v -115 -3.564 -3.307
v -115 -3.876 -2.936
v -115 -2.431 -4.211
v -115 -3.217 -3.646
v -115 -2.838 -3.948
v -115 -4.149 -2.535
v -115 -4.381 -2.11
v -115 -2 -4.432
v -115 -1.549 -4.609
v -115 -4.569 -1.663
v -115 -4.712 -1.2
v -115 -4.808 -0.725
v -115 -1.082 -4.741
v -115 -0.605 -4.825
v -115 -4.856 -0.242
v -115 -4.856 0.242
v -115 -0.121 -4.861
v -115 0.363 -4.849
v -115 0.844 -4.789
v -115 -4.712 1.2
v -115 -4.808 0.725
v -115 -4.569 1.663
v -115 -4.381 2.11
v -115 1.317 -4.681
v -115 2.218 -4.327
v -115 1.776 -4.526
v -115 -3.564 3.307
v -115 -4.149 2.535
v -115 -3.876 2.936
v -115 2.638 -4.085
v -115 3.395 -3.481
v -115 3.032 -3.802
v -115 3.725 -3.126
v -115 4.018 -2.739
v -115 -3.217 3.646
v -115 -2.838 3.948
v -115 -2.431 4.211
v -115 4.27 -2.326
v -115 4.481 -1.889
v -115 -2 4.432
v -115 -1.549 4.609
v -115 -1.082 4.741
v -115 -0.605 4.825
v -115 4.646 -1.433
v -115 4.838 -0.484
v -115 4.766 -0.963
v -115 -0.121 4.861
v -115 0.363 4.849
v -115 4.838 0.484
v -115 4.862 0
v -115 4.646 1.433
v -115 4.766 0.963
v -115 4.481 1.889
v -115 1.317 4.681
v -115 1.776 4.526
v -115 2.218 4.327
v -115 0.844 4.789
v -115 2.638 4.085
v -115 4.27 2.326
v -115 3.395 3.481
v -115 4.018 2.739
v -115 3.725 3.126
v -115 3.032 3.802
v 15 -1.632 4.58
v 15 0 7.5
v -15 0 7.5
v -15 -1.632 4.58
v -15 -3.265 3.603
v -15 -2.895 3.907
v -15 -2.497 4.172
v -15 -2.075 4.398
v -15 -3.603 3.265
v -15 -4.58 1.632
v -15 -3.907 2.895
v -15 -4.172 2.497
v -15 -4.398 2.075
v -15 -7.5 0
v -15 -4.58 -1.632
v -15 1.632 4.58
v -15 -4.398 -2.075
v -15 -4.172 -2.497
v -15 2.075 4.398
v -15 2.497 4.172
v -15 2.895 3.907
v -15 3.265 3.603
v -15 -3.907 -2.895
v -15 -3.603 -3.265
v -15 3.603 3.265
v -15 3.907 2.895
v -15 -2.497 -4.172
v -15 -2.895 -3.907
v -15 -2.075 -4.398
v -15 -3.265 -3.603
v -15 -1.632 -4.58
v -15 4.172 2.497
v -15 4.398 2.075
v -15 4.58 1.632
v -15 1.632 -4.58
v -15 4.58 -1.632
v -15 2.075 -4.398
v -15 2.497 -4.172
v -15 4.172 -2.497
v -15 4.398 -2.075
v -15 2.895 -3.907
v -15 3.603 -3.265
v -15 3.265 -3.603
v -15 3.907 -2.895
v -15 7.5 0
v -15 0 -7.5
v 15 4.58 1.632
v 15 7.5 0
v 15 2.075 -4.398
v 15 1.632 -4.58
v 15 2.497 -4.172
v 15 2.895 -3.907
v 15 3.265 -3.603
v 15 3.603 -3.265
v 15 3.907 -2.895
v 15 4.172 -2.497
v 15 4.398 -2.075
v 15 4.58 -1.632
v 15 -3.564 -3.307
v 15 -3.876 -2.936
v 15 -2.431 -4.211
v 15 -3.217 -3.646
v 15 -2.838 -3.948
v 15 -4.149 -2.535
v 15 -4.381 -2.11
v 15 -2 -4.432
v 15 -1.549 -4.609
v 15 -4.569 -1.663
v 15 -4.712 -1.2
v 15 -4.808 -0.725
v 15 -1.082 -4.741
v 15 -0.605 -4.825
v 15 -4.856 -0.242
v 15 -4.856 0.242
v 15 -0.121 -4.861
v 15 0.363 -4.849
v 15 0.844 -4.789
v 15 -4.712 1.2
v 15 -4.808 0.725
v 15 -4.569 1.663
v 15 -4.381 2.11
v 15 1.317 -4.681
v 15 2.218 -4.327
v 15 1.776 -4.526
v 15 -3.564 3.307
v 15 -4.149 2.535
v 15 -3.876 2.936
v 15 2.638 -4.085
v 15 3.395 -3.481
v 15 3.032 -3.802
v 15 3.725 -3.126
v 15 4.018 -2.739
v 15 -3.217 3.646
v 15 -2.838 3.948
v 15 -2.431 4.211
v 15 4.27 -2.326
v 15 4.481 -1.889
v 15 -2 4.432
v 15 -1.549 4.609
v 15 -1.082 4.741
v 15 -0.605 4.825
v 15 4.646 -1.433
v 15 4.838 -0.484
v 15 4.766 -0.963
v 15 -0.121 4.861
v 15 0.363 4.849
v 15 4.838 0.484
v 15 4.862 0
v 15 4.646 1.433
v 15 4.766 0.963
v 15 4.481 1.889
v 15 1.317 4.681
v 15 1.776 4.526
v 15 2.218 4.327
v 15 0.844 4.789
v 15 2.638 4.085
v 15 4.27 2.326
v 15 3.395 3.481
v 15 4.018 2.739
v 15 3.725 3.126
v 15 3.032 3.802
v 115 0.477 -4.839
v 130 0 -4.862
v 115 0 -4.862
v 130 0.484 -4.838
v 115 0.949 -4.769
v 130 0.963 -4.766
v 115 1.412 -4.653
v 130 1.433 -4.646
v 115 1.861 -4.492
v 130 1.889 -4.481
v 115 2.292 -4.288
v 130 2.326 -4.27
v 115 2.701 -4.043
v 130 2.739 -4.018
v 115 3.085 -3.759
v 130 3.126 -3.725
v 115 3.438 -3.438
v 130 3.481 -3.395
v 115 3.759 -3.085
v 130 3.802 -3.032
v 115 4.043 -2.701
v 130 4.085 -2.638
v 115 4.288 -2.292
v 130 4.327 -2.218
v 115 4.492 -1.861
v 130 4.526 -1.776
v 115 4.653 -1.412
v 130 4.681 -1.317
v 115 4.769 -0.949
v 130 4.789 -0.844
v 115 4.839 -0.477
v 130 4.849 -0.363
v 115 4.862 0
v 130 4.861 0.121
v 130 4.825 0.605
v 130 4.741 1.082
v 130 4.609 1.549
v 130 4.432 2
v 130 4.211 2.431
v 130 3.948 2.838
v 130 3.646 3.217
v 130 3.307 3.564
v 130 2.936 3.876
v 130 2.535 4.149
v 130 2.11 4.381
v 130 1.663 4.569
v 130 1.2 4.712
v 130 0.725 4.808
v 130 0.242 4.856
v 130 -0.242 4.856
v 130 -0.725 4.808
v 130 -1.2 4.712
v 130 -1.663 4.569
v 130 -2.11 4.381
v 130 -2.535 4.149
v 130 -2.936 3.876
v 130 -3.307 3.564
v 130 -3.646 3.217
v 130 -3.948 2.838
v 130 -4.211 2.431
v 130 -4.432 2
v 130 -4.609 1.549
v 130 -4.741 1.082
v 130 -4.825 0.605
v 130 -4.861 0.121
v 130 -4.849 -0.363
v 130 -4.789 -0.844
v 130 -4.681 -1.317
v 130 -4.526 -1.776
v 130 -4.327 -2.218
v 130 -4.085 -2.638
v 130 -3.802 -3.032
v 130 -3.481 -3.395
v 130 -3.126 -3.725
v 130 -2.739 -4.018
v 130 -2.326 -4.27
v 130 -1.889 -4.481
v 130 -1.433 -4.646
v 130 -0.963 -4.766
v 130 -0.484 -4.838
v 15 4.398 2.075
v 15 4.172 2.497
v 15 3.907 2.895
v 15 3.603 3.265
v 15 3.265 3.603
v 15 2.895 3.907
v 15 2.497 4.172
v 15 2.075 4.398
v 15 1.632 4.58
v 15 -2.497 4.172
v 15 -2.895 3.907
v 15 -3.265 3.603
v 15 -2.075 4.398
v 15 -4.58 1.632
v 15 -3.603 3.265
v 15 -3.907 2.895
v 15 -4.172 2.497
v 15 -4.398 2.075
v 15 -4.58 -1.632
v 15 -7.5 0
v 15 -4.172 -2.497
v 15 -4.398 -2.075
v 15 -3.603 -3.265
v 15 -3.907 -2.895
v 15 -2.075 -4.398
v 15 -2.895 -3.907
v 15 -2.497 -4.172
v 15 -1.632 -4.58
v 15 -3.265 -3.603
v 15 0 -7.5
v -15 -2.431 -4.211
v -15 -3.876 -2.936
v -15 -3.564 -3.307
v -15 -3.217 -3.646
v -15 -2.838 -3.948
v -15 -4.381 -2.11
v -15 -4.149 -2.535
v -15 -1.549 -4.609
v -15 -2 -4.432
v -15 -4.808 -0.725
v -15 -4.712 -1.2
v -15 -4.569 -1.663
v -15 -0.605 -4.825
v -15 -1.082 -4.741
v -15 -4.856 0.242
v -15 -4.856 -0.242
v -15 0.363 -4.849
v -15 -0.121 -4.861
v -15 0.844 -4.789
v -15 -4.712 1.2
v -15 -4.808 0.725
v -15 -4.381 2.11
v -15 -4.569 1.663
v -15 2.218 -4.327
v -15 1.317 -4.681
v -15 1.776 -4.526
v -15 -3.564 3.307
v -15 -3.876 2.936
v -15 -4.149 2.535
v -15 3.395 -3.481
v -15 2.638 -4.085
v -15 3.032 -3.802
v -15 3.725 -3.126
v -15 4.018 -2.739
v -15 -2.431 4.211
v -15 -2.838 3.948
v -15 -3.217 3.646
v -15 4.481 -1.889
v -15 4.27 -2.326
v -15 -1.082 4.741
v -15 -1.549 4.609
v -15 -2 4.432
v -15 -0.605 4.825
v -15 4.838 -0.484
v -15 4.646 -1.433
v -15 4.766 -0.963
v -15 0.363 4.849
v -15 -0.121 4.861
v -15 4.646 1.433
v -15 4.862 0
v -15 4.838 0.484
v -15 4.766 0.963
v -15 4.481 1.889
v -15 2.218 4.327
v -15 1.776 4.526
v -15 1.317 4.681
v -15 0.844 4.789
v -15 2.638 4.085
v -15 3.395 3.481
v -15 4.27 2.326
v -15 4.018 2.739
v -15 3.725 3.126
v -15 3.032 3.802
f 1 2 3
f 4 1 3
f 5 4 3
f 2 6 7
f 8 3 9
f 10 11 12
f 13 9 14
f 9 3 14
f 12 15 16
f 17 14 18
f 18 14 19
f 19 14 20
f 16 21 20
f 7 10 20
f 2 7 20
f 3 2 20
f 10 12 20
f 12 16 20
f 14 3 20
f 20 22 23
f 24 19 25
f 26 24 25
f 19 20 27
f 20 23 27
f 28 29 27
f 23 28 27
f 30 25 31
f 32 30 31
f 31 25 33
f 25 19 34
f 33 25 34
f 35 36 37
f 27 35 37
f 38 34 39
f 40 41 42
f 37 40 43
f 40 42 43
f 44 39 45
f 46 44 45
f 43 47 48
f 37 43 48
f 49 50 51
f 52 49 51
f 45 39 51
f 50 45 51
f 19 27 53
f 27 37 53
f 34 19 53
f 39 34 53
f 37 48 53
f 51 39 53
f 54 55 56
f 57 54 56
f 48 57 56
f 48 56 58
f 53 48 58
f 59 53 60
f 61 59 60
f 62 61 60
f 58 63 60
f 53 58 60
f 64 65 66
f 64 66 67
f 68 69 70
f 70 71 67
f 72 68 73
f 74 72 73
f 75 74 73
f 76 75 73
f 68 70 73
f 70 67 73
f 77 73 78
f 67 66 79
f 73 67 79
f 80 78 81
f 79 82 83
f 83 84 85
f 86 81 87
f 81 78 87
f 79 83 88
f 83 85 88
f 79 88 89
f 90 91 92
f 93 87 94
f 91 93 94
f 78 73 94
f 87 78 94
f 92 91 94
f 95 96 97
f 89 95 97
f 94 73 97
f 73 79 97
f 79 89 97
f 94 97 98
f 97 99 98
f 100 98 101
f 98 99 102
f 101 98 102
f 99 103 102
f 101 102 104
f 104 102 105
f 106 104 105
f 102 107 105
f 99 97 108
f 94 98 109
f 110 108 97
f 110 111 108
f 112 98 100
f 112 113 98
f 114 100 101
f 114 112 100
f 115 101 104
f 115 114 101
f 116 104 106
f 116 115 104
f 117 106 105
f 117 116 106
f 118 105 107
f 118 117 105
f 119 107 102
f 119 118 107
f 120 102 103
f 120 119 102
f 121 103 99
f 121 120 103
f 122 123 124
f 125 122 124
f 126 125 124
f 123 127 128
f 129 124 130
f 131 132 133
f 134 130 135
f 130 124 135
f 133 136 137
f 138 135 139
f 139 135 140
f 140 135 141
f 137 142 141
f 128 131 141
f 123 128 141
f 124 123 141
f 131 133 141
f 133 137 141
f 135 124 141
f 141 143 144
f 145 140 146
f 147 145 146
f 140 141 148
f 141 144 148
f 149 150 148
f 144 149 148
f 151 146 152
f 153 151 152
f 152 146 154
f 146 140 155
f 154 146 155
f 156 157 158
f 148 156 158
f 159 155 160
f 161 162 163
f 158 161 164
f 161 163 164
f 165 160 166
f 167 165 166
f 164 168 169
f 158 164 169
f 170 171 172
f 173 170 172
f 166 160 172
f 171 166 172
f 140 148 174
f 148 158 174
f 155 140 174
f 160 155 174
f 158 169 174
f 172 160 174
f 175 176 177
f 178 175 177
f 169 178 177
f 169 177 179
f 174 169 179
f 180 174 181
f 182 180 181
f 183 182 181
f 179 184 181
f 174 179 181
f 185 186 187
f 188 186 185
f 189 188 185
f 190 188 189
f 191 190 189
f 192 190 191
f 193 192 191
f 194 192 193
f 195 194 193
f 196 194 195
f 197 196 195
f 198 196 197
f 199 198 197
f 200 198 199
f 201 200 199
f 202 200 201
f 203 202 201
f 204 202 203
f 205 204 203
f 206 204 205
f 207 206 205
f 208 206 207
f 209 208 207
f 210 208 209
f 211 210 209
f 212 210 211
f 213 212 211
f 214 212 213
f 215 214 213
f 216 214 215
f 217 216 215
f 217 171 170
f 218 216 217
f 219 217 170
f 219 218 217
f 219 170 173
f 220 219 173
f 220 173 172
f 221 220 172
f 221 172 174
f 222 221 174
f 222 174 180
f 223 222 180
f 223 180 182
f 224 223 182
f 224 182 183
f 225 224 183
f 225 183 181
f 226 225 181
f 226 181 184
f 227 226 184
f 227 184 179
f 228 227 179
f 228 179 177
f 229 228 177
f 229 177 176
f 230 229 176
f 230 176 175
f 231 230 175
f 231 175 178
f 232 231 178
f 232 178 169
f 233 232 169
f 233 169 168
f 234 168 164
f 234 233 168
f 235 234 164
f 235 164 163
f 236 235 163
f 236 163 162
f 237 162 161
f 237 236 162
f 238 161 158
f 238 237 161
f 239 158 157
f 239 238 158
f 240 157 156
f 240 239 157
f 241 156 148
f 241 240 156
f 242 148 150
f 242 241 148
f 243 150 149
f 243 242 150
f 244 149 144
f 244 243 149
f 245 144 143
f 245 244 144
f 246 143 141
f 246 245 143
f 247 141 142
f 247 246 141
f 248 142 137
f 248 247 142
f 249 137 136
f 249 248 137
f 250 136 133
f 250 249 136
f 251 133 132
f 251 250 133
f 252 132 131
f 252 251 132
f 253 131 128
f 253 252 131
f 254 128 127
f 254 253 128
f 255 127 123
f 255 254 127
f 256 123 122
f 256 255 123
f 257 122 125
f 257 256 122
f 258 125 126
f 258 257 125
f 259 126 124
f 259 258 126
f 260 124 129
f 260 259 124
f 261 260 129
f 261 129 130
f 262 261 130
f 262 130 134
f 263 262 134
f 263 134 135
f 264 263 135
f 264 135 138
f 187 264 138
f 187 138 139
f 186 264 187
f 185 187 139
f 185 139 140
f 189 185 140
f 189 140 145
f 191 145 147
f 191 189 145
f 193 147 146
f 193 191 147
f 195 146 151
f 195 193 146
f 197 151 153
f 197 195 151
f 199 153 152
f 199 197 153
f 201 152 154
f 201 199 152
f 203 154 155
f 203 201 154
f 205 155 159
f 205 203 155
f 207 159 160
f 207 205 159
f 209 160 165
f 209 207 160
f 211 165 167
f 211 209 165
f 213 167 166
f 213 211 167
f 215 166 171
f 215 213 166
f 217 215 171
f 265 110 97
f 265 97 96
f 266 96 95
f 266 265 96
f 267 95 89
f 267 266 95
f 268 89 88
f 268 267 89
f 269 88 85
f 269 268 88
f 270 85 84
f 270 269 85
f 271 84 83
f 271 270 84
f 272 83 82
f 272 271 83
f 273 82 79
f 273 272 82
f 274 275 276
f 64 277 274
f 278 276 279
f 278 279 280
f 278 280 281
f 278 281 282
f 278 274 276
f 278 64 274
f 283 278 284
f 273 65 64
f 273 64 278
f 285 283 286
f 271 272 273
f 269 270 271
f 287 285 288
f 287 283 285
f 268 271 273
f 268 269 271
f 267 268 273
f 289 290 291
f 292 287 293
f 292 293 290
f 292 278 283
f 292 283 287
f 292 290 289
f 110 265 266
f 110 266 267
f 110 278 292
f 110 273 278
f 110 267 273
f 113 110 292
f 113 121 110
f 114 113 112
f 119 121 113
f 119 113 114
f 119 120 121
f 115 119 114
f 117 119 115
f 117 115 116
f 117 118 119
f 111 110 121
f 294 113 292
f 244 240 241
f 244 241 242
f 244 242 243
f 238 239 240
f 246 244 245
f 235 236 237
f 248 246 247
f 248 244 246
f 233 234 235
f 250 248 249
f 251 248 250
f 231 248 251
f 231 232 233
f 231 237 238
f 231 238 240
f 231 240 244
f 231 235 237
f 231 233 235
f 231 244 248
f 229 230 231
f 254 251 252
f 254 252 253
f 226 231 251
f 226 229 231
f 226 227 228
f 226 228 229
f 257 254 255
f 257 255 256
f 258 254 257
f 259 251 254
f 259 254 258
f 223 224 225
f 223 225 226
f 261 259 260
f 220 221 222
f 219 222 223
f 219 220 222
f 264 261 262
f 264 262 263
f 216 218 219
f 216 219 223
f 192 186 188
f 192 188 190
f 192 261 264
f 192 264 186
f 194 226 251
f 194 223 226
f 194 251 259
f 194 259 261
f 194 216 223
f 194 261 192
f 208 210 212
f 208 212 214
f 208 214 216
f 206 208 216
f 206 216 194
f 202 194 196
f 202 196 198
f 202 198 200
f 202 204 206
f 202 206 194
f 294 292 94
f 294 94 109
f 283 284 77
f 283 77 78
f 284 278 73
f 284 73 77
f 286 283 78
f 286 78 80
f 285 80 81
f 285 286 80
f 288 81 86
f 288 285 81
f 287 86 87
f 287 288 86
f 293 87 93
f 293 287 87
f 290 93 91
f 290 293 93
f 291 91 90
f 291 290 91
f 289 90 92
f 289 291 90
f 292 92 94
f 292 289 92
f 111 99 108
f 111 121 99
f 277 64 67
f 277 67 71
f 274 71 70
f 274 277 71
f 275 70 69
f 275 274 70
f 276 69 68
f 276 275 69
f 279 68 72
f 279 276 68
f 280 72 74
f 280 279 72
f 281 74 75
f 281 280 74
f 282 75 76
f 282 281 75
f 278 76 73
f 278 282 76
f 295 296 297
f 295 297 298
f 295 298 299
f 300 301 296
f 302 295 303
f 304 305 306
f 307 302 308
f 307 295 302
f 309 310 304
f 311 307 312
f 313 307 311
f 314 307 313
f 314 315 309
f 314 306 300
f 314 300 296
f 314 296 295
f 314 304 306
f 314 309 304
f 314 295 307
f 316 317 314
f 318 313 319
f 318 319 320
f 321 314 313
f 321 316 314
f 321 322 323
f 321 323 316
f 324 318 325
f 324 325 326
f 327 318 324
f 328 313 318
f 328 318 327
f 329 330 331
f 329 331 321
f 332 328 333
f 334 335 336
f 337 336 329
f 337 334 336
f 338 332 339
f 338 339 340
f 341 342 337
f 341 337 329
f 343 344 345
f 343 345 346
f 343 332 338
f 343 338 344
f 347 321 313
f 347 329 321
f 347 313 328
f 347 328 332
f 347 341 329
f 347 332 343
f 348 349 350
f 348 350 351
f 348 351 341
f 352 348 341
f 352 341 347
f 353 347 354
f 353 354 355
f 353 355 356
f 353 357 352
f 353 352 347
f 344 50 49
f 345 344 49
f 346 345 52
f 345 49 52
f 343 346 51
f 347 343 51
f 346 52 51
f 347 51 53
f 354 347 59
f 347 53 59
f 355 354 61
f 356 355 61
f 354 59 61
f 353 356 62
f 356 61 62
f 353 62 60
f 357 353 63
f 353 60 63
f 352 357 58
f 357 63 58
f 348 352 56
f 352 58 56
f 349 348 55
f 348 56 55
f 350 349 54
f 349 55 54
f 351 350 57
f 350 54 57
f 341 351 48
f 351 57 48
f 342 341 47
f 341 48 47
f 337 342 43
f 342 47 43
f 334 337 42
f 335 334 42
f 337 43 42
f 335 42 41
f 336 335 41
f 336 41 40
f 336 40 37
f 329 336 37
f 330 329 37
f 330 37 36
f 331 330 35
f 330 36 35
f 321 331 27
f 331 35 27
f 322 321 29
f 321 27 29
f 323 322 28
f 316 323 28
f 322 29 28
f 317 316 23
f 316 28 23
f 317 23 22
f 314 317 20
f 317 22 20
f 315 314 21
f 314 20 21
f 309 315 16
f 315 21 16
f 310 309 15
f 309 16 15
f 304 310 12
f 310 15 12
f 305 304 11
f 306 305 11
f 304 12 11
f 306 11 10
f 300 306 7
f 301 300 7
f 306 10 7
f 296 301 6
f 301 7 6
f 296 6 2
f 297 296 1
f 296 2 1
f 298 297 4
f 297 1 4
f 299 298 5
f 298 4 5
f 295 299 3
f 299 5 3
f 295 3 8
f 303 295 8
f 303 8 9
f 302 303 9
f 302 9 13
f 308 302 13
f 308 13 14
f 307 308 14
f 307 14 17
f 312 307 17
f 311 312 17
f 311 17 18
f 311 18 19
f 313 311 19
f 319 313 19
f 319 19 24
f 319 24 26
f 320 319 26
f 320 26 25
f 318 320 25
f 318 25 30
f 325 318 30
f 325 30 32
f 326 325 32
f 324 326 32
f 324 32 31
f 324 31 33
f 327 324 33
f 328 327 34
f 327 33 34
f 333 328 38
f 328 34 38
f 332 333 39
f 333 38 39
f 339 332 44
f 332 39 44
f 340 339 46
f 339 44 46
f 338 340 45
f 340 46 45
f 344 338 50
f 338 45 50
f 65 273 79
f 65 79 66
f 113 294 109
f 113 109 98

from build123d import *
from build123d.topology import SkipClean

# Parameters (mm, degrees)
SKETCH1_W           = 230
SKETCH1_H           = 4.8625
BOSS_EXTRUDE1_DEPTH = 15
SPLIT1_START        = -115
SPLIT1_OUTLINE_R    = 4.8625
SPLIT1_DEPTH        = 100
SPLIT1_START_2      = 15
SPLIT1_2_OUTLINE_R  = 4.8625
SPLIT1_2_DEPTH      = 100
SPLIT1_3_OUTLINE_R  = 4.8625
SPLIT1_3_DEPTH      = 100
SPLIT1_4_OUTLINE_R  = 4.8625
SPLIT1_4_DEPTH      = 100
BOSS_EXTRUDE2_START = 15
SKETCH3_R           = 4.8625
BOSS_EXTRUDE2_DEPTH = 15


# Read off the part's stored shape, not the designer's step: Split1
with BuildPart() as part:
    # Sketch1 → Revolve2 (revolve)
    with BuildSketch(Plane(origin=(0, 0, 0), x_dir=(1, 0, 0), z_dir=(0, 1, 0))):
        with Locations((0, -2.43125)):
            Rectangle(SKETCH1_W, SKETCH1_H)
    revolve(axis=Axis((-115, 0, 0), (1, 0, 0)))

    # Sketch2 → Boss-Extrude1 (add, symmetric)
    with SkipClean():  # the faces are left unmerged after this step: merging them gives an invalid solid
        with BuildSketch(Plane(origin=(0, 0, 0), x_dir=(0, 0, -1), z_dir=(1, 0, 0))):
            with BuildLine():
                Line((0, 7.5), (-1.6323529, 4.580319886))
                ThreePointArc((-1.6323529, 4.580319886), (-3.438306724, 3.438306724), (-4.580319886, 1.6323529))
                Line((-4.580319886, 1.6323529), (-7.5, 0))
                Line((-7.5, 0), (-4.580319886, -1.6323529))
                ThreePointArc((-4.580319886, -1.6323529), (-3.438306724, -3.438306724), (-1.6323529, -4.580319886))
                Line((-1.6323529, -4.580319886), (0, -7.5))
                Line((0, -7.5), (1.6323529, -4.580319886))
                ThreePointArc((1.6323529, -4.580319886), (3.438306724, -3.438306724), (4.580319886, -1.6323529))
                Line((4.580319886, -1.6323529), (7.5, 0))
                Line((7.5, 0), (4.580319886, 1.6323529))
                ThreePointArc((4.580319886, 1.6323529), (3.438306724, 3.438306724), (1.6323529, 4.580319886))
                Line((1.6323529, 4.580319886), (0, 7.5))
            make_face()
        extrude(amount=BOSS_EXTRUDE1_DEPTH, both=True)

    # Split1 outline → Split1 (cut)
    with SkipClean():  # the faces are left unmerged after this step: merging them gives an invalid solid
        with BuildSketch(Plane.YZ.offset(SPLIT1_START)):
            Circle(SPLIT1_OUTLINE_R)
        extrude(amount=SPLIT1_DEPTH, mode=Mode.SUBTRACT)

    # Split1 2 outline → Split1 2 (cut)
    with BuildSketch(Plane.YZ.offset(SPLIT1_START_2)):
        Circle(SPLIT1_2_OUTLINE_R)
    extrude(amount=SPLIT1_2_DEPTH, mode=Mode.SUBTRACT)


with BuildPart() as body_2:
    # Split1 3 outline → Split1 3 (new body)
    with BuildSketch(Plane.YZ.offset(SPLIT1_START_2)):
        Circle(SPLIT1_3_OUTLINE_R)
    extrude(amount=SPLIT1_3_DEPTH)

    # Sketch3 → Boss-Extrude2 (add)
    with BuildSketch(Plane(origin=(115, 0, 0), x_dir=(0, 0, -1), z_dir=(1, 0, 0)).offset(BOSS_EXTRUDE2_START)):
        Circle(SKETCH3_R)
    extrude(amount=-BOSS_EXTRUDE2_DEPTH)


with BuildPart() as body_3:
    # Split1 4 outline → Split1 4 (new body)
    with BuildSketch(Plane.YZ.offset(SPLIT1_START)):
        Circle(SPLIT1_4_OUTLINE_R)
    extrude(amount=SPLIT1_4_DEPTH)


solid = Compound([part.part, body_2.part, body_3.part])
